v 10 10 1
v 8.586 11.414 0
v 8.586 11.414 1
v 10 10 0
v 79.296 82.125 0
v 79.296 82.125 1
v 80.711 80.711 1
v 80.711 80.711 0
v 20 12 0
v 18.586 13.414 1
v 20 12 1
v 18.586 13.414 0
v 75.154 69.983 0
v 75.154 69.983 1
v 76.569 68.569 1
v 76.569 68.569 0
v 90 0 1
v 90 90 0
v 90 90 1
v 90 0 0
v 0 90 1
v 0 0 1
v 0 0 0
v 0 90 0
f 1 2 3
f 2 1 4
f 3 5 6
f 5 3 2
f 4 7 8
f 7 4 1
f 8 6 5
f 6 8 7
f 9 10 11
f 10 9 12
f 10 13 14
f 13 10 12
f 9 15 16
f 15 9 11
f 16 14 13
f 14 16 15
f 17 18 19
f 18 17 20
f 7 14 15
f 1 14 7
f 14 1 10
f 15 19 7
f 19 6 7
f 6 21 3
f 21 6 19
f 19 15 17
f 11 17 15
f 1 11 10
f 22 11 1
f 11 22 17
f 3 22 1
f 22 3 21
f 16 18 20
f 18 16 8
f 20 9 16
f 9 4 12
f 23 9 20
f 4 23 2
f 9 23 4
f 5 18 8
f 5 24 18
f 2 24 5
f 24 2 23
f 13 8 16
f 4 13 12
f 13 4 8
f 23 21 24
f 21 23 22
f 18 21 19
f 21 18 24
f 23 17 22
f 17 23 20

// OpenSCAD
difference() {
	cube([90, 90, 1]);
	translate([10, 10, -1]) {
		rotate([0, 0, 45]) {
			cube([100, 2, 3]);
		}
		translate([10, 2, 0]) {
			rotate([0, 0, 45]) {
				cube([80, 2, 3]);
			}
		}
	}
}
